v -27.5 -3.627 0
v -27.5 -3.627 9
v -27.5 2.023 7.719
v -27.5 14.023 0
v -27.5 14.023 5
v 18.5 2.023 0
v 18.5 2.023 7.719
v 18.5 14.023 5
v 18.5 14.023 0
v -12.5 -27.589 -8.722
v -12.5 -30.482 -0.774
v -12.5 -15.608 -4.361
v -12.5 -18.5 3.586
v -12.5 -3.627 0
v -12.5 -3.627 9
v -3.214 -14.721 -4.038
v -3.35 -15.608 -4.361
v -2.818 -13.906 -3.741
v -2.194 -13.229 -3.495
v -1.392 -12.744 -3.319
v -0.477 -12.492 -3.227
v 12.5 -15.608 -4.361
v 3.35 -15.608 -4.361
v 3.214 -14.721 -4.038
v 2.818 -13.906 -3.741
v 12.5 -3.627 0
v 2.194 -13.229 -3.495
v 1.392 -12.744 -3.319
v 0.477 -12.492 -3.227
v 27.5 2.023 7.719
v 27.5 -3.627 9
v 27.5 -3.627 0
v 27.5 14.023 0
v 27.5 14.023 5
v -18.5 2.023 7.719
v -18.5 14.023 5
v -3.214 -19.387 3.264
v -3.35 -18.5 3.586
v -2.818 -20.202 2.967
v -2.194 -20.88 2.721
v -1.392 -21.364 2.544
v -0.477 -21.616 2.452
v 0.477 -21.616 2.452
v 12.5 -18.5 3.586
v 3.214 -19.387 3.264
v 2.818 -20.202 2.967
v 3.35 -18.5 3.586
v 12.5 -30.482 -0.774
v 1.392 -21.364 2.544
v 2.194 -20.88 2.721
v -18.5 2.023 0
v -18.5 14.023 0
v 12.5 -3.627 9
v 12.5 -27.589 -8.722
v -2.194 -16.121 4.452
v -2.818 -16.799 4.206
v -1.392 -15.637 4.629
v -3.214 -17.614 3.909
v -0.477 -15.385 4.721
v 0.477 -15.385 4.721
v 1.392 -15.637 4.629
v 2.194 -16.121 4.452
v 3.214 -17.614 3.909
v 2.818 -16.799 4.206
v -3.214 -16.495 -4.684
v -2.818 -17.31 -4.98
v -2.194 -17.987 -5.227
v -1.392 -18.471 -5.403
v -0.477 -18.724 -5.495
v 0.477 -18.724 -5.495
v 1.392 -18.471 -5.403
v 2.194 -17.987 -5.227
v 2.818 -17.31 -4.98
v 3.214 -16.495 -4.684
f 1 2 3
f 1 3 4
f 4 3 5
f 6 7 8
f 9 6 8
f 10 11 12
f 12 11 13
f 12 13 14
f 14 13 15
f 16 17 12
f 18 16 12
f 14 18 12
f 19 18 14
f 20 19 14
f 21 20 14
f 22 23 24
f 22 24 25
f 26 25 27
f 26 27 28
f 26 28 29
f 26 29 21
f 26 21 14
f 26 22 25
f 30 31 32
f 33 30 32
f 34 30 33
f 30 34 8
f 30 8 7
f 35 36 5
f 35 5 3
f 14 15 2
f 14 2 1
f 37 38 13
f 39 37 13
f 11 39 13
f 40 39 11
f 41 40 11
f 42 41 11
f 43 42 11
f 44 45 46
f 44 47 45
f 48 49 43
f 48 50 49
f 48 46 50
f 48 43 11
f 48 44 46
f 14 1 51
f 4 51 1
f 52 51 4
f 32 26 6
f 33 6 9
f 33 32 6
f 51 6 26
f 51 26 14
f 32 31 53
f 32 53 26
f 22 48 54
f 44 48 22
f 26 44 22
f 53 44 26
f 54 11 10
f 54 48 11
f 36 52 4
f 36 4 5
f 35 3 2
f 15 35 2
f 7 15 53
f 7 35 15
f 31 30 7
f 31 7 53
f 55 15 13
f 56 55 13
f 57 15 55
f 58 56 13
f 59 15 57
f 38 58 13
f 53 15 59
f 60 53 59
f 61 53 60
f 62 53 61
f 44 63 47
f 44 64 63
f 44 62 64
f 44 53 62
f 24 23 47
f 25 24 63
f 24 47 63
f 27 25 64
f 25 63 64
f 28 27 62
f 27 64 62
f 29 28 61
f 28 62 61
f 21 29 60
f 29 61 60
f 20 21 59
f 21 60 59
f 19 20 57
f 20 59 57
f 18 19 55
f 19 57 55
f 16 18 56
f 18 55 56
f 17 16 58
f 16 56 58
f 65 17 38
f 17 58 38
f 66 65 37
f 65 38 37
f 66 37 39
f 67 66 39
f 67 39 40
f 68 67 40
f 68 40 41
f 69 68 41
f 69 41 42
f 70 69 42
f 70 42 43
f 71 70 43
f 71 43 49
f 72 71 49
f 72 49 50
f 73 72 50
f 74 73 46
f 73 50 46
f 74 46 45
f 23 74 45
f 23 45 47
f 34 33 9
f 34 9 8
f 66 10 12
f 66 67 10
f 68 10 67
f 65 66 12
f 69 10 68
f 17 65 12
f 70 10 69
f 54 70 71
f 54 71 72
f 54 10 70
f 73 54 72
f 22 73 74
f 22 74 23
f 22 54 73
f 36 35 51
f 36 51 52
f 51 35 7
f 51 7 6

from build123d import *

# Parameters (mm, degrees)
F1_DEPTH = 27.5
F2_DEPTH = 12.5
F3_DEPTH = 18.5
F4_R     = 3.35
F5_DEPTH = 8.4572335871


with BuildPart() as f1:
    # F0 (on Right) → F1 (new body, symmetric)
    with BuildSketch(Plane.YZ):
        Polygon((2.0231563184, 7.7193960785), (2.0231563184, 0), (14.0231563184, 0), (14.0231563184, 4.9995293425), align=None)
        Polygon((-3.6268436816, 9), (-3.6268436816, 0), (2.0231563184, 0), (2.0231563184, 7.7193960785), align=None)
    extrude(amount=F1_DEPTH, both=True)

    # F0 (on Right) → F2 (join, symmetric)
    with BuildSketch(Plane.YZ):
        Polygon((-15.6079412508, -4.360762889), (-3.6268436816, 0), (-3.6268436816, 9), (-18.5004854943, 3.586437105), align=None)
        Polygon((-27.5890355811, -8.7215245992), (-15.6079412508, -4.360762889), (-18.5004854943, 3.586437105), (-30.4815798247, -0.7743246052), align=None)
    extrude(amount=F2_DEPTH, both=True)

    # F0 (on Right) → F3 (cut, symmetric)
    with BuildSketch(Plane.YZ):
        Polygon((2.0231563184, 7.7193960785), (2.0231563184, 0), (14.0231563184, 0), (14.0231563184, 4.9995293425), align=None)
    extrude(amount=F3_DEPTH, both=True, mode=Mode.SUBTRACT)

    # F4 (on face) → F5 (cut, through all)
    with BuildSketch(Plane(origin=(0, -3.3168043602, 9.1128450844), x_dir=(1, 0, 0), z_dir=(0, -0.3420201433, 0.9396926208))):
        with Locations((0, -16.1581359673)):
            Circle(F4_R)
    extrude(amount=-F5_DEPTH, mode=Mode.SUBTRACT)


solid = f1.part
